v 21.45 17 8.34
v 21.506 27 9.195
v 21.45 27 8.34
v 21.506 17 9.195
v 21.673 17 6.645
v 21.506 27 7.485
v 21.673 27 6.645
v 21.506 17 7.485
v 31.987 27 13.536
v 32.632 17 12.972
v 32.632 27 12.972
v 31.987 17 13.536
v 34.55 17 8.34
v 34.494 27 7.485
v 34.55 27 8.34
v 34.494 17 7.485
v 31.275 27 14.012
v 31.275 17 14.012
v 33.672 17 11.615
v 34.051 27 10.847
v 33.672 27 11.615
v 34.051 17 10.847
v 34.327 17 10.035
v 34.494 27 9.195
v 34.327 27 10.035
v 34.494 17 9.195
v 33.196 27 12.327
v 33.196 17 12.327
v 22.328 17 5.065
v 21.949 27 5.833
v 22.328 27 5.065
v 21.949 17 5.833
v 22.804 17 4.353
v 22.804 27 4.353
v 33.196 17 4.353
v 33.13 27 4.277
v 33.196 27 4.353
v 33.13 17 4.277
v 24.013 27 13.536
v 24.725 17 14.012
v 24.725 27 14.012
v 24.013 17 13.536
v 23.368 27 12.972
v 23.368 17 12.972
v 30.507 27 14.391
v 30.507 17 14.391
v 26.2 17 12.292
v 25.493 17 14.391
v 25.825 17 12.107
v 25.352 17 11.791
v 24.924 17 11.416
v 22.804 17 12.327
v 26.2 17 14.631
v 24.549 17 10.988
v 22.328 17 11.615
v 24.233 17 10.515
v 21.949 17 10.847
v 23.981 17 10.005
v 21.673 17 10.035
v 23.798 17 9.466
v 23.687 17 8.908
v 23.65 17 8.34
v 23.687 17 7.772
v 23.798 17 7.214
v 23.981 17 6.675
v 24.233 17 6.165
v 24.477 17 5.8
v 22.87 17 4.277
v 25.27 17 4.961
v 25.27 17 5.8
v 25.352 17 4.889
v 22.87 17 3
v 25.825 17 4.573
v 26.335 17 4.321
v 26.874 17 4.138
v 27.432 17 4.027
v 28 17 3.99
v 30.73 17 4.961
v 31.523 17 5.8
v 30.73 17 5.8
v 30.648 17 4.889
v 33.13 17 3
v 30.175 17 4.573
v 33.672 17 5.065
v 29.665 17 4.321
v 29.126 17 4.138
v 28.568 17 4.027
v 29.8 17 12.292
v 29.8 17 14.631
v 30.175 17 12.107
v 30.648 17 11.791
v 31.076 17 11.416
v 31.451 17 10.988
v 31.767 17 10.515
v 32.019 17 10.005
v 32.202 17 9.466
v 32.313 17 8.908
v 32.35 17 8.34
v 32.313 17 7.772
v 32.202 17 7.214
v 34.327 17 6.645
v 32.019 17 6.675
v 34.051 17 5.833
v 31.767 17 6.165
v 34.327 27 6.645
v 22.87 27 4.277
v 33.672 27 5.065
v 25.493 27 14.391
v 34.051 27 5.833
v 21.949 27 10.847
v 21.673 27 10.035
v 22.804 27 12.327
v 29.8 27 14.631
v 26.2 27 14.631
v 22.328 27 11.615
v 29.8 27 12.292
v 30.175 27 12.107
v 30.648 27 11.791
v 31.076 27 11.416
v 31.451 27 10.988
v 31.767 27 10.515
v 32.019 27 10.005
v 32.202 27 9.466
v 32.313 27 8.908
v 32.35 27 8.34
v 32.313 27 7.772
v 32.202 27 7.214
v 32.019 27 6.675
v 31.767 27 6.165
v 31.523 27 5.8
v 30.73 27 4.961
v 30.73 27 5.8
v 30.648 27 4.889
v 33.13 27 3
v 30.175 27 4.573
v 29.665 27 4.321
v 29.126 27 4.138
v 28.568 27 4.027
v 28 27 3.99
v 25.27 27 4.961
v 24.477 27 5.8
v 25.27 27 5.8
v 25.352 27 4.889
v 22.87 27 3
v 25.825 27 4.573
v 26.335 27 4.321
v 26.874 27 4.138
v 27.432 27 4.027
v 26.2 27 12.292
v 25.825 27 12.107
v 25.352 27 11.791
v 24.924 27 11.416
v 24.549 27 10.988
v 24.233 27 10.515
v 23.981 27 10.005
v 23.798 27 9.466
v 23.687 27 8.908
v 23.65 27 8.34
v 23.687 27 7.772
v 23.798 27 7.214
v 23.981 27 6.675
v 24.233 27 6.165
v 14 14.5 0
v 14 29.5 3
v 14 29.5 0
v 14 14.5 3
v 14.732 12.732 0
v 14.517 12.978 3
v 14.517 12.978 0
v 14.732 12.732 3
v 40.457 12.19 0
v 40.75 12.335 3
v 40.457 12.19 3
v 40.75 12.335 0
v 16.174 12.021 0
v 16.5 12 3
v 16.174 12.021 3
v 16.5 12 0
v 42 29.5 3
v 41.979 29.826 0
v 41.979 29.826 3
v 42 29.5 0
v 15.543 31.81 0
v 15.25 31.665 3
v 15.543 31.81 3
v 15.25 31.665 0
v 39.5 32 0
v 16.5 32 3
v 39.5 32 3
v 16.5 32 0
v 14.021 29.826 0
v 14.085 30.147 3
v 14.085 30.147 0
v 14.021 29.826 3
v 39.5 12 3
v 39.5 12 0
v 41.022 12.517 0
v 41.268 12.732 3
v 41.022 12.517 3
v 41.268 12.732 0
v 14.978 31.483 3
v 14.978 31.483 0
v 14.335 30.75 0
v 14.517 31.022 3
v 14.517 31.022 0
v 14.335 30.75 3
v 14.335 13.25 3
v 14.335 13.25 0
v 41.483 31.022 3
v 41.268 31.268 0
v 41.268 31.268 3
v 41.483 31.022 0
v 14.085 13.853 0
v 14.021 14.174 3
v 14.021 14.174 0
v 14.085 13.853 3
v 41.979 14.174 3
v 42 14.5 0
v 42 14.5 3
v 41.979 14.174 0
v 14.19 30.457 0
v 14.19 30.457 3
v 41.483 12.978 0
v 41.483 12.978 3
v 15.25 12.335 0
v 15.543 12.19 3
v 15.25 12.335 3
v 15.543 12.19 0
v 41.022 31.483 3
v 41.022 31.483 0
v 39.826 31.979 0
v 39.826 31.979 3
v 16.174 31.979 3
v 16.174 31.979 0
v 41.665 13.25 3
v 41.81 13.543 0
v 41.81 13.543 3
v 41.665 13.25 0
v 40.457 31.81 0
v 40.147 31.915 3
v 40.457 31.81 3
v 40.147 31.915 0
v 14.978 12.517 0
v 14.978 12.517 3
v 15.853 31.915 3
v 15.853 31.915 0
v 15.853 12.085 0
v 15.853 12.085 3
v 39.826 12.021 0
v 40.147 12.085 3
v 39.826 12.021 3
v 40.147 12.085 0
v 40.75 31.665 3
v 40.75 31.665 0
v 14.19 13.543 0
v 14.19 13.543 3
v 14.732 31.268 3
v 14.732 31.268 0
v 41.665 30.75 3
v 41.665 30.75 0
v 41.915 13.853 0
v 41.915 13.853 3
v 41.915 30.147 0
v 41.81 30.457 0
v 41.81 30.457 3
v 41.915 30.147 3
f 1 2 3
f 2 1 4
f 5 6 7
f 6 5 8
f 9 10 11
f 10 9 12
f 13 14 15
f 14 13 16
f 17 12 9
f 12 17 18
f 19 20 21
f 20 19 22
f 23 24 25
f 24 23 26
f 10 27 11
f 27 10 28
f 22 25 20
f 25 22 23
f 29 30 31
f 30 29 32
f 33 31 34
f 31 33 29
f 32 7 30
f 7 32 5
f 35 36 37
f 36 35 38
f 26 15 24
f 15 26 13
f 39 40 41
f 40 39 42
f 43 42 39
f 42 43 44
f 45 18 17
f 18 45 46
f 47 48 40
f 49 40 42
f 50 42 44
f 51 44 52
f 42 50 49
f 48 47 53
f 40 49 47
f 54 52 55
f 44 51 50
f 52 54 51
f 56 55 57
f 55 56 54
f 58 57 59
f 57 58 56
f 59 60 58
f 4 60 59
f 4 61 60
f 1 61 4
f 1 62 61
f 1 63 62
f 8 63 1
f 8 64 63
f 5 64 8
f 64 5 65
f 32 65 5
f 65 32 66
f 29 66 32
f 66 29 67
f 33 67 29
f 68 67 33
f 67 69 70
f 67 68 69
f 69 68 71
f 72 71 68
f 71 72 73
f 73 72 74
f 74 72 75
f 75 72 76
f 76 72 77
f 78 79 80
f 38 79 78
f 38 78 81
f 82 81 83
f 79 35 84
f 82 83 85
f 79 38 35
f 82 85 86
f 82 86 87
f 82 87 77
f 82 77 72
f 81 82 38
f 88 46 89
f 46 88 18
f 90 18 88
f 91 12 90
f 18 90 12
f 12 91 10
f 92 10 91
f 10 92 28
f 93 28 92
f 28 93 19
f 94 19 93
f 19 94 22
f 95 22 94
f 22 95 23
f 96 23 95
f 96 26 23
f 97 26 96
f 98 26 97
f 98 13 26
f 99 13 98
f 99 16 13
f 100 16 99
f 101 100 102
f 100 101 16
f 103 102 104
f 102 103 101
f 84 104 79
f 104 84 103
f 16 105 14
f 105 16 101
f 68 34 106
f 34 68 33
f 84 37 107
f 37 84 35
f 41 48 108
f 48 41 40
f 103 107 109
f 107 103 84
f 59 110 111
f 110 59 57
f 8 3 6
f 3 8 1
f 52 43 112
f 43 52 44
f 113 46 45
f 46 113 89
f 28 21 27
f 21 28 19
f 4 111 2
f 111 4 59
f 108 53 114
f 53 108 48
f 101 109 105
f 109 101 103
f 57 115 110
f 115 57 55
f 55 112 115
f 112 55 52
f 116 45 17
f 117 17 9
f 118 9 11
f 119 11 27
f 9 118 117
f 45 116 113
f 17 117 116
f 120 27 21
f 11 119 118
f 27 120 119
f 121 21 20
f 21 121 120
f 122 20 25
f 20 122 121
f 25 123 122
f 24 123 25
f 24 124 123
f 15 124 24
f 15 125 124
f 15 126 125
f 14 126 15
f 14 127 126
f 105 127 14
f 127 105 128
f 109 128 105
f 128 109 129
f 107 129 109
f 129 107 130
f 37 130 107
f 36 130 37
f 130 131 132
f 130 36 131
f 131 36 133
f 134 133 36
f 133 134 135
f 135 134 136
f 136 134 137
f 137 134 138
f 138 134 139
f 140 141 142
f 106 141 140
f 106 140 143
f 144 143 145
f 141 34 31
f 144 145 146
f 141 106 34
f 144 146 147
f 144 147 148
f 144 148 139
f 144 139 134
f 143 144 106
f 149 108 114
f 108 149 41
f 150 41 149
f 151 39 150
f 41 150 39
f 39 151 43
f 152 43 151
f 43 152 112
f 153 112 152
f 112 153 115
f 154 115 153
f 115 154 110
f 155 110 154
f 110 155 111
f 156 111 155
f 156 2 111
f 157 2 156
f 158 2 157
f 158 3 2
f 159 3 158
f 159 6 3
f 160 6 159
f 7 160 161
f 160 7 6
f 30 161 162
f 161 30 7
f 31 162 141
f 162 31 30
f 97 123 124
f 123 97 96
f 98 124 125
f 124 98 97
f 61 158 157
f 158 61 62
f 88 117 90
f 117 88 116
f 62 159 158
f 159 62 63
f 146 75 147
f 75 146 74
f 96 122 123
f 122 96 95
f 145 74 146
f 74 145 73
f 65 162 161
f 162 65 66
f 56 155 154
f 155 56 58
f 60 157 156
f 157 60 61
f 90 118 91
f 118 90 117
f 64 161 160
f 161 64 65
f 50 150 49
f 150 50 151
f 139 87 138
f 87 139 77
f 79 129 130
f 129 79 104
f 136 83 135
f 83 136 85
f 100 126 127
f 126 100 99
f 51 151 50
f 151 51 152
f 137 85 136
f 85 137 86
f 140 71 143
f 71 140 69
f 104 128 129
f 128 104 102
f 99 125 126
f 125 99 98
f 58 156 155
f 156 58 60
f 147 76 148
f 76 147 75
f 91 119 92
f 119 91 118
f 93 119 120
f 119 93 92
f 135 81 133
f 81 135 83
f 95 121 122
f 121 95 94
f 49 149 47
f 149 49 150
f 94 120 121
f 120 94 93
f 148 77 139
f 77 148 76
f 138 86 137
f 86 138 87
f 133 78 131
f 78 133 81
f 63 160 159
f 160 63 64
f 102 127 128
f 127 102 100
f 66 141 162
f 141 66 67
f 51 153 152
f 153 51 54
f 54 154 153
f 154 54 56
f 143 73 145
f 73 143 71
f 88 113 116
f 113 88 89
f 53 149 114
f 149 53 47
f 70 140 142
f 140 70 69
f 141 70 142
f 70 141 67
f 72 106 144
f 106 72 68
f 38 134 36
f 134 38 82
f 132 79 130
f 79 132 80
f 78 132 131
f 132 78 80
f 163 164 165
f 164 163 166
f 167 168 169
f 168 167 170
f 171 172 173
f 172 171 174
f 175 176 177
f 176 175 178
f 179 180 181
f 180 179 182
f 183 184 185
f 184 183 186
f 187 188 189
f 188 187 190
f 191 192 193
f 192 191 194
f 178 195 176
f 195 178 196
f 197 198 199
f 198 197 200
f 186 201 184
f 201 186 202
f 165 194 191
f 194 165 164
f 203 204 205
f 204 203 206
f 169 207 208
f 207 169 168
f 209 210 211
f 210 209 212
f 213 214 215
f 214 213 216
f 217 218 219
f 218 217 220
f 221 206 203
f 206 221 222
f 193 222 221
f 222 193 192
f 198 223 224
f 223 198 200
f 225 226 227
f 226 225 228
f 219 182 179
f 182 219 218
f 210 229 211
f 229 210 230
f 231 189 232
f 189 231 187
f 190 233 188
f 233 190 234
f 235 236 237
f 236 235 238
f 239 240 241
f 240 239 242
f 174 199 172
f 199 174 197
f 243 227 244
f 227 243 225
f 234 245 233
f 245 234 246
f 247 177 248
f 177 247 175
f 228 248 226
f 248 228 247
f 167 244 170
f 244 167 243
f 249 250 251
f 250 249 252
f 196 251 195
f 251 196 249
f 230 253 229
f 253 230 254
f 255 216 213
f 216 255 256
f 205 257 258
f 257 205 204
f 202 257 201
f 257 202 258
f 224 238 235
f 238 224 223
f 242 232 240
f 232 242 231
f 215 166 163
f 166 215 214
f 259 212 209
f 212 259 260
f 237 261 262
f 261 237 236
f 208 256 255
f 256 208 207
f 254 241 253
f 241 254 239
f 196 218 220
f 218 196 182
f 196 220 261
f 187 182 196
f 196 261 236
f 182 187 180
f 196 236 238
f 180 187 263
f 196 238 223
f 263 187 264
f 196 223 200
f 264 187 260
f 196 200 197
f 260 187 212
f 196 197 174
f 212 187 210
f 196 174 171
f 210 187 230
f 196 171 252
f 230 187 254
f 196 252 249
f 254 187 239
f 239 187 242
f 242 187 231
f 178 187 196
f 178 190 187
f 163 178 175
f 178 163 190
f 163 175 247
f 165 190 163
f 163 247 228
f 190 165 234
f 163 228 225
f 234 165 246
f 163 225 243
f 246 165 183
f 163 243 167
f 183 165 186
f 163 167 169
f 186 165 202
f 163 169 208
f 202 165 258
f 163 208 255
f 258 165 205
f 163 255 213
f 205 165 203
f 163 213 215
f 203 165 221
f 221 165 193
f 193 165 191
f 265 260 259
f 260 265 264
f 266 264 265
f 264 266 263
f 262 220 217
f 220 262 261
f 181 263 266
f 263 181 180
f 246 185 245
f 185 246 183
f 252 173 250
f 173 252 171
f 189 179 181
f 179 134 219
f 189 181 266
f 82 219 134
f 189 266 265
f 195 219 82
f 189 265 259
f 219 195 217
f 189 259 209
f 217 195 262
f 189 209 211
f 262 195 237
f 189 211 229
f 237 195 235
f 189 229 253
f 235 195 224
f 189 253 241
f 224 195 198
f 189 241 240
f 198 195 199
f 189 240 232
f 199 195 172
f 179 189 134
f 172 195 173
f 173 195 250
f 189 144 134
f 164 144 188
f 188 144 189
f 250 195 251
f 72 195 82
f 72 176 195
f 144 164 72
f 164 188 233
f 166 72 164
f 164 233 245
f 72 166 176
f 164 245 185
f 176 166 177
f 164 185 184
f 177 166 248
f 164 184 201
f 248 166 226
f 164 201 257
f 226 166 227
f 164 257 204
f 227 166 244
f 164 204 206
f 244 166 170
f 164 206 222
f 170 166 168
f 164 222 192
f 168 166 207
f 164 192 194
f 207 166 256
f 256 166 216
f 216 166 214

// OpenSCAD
/*
Sample 115: Wiederlösbarer Kabel-Schnappclip — Kabel 8 mm
Generated from the FDM Mechanical Sample Library.
Units: millimetres.

Override examples:
  openscad -o custom.stl -D 'view="plate"' -D 'render_fn=64' model.scad
  openscad -o preview.png -D 'view="assembly"' model.scad
*/
use <../../../library/fdm_mechanisms.scad>

render_fn = is_undef(render_fn) ? 48 : render_fn;
view = is_undef(view) ? "plate" : view;
$fn = render_fn;

sample_cable_clip(
    view=view,
    cable_d=8,
    clearance=0.35,
    wall=2.2
);
